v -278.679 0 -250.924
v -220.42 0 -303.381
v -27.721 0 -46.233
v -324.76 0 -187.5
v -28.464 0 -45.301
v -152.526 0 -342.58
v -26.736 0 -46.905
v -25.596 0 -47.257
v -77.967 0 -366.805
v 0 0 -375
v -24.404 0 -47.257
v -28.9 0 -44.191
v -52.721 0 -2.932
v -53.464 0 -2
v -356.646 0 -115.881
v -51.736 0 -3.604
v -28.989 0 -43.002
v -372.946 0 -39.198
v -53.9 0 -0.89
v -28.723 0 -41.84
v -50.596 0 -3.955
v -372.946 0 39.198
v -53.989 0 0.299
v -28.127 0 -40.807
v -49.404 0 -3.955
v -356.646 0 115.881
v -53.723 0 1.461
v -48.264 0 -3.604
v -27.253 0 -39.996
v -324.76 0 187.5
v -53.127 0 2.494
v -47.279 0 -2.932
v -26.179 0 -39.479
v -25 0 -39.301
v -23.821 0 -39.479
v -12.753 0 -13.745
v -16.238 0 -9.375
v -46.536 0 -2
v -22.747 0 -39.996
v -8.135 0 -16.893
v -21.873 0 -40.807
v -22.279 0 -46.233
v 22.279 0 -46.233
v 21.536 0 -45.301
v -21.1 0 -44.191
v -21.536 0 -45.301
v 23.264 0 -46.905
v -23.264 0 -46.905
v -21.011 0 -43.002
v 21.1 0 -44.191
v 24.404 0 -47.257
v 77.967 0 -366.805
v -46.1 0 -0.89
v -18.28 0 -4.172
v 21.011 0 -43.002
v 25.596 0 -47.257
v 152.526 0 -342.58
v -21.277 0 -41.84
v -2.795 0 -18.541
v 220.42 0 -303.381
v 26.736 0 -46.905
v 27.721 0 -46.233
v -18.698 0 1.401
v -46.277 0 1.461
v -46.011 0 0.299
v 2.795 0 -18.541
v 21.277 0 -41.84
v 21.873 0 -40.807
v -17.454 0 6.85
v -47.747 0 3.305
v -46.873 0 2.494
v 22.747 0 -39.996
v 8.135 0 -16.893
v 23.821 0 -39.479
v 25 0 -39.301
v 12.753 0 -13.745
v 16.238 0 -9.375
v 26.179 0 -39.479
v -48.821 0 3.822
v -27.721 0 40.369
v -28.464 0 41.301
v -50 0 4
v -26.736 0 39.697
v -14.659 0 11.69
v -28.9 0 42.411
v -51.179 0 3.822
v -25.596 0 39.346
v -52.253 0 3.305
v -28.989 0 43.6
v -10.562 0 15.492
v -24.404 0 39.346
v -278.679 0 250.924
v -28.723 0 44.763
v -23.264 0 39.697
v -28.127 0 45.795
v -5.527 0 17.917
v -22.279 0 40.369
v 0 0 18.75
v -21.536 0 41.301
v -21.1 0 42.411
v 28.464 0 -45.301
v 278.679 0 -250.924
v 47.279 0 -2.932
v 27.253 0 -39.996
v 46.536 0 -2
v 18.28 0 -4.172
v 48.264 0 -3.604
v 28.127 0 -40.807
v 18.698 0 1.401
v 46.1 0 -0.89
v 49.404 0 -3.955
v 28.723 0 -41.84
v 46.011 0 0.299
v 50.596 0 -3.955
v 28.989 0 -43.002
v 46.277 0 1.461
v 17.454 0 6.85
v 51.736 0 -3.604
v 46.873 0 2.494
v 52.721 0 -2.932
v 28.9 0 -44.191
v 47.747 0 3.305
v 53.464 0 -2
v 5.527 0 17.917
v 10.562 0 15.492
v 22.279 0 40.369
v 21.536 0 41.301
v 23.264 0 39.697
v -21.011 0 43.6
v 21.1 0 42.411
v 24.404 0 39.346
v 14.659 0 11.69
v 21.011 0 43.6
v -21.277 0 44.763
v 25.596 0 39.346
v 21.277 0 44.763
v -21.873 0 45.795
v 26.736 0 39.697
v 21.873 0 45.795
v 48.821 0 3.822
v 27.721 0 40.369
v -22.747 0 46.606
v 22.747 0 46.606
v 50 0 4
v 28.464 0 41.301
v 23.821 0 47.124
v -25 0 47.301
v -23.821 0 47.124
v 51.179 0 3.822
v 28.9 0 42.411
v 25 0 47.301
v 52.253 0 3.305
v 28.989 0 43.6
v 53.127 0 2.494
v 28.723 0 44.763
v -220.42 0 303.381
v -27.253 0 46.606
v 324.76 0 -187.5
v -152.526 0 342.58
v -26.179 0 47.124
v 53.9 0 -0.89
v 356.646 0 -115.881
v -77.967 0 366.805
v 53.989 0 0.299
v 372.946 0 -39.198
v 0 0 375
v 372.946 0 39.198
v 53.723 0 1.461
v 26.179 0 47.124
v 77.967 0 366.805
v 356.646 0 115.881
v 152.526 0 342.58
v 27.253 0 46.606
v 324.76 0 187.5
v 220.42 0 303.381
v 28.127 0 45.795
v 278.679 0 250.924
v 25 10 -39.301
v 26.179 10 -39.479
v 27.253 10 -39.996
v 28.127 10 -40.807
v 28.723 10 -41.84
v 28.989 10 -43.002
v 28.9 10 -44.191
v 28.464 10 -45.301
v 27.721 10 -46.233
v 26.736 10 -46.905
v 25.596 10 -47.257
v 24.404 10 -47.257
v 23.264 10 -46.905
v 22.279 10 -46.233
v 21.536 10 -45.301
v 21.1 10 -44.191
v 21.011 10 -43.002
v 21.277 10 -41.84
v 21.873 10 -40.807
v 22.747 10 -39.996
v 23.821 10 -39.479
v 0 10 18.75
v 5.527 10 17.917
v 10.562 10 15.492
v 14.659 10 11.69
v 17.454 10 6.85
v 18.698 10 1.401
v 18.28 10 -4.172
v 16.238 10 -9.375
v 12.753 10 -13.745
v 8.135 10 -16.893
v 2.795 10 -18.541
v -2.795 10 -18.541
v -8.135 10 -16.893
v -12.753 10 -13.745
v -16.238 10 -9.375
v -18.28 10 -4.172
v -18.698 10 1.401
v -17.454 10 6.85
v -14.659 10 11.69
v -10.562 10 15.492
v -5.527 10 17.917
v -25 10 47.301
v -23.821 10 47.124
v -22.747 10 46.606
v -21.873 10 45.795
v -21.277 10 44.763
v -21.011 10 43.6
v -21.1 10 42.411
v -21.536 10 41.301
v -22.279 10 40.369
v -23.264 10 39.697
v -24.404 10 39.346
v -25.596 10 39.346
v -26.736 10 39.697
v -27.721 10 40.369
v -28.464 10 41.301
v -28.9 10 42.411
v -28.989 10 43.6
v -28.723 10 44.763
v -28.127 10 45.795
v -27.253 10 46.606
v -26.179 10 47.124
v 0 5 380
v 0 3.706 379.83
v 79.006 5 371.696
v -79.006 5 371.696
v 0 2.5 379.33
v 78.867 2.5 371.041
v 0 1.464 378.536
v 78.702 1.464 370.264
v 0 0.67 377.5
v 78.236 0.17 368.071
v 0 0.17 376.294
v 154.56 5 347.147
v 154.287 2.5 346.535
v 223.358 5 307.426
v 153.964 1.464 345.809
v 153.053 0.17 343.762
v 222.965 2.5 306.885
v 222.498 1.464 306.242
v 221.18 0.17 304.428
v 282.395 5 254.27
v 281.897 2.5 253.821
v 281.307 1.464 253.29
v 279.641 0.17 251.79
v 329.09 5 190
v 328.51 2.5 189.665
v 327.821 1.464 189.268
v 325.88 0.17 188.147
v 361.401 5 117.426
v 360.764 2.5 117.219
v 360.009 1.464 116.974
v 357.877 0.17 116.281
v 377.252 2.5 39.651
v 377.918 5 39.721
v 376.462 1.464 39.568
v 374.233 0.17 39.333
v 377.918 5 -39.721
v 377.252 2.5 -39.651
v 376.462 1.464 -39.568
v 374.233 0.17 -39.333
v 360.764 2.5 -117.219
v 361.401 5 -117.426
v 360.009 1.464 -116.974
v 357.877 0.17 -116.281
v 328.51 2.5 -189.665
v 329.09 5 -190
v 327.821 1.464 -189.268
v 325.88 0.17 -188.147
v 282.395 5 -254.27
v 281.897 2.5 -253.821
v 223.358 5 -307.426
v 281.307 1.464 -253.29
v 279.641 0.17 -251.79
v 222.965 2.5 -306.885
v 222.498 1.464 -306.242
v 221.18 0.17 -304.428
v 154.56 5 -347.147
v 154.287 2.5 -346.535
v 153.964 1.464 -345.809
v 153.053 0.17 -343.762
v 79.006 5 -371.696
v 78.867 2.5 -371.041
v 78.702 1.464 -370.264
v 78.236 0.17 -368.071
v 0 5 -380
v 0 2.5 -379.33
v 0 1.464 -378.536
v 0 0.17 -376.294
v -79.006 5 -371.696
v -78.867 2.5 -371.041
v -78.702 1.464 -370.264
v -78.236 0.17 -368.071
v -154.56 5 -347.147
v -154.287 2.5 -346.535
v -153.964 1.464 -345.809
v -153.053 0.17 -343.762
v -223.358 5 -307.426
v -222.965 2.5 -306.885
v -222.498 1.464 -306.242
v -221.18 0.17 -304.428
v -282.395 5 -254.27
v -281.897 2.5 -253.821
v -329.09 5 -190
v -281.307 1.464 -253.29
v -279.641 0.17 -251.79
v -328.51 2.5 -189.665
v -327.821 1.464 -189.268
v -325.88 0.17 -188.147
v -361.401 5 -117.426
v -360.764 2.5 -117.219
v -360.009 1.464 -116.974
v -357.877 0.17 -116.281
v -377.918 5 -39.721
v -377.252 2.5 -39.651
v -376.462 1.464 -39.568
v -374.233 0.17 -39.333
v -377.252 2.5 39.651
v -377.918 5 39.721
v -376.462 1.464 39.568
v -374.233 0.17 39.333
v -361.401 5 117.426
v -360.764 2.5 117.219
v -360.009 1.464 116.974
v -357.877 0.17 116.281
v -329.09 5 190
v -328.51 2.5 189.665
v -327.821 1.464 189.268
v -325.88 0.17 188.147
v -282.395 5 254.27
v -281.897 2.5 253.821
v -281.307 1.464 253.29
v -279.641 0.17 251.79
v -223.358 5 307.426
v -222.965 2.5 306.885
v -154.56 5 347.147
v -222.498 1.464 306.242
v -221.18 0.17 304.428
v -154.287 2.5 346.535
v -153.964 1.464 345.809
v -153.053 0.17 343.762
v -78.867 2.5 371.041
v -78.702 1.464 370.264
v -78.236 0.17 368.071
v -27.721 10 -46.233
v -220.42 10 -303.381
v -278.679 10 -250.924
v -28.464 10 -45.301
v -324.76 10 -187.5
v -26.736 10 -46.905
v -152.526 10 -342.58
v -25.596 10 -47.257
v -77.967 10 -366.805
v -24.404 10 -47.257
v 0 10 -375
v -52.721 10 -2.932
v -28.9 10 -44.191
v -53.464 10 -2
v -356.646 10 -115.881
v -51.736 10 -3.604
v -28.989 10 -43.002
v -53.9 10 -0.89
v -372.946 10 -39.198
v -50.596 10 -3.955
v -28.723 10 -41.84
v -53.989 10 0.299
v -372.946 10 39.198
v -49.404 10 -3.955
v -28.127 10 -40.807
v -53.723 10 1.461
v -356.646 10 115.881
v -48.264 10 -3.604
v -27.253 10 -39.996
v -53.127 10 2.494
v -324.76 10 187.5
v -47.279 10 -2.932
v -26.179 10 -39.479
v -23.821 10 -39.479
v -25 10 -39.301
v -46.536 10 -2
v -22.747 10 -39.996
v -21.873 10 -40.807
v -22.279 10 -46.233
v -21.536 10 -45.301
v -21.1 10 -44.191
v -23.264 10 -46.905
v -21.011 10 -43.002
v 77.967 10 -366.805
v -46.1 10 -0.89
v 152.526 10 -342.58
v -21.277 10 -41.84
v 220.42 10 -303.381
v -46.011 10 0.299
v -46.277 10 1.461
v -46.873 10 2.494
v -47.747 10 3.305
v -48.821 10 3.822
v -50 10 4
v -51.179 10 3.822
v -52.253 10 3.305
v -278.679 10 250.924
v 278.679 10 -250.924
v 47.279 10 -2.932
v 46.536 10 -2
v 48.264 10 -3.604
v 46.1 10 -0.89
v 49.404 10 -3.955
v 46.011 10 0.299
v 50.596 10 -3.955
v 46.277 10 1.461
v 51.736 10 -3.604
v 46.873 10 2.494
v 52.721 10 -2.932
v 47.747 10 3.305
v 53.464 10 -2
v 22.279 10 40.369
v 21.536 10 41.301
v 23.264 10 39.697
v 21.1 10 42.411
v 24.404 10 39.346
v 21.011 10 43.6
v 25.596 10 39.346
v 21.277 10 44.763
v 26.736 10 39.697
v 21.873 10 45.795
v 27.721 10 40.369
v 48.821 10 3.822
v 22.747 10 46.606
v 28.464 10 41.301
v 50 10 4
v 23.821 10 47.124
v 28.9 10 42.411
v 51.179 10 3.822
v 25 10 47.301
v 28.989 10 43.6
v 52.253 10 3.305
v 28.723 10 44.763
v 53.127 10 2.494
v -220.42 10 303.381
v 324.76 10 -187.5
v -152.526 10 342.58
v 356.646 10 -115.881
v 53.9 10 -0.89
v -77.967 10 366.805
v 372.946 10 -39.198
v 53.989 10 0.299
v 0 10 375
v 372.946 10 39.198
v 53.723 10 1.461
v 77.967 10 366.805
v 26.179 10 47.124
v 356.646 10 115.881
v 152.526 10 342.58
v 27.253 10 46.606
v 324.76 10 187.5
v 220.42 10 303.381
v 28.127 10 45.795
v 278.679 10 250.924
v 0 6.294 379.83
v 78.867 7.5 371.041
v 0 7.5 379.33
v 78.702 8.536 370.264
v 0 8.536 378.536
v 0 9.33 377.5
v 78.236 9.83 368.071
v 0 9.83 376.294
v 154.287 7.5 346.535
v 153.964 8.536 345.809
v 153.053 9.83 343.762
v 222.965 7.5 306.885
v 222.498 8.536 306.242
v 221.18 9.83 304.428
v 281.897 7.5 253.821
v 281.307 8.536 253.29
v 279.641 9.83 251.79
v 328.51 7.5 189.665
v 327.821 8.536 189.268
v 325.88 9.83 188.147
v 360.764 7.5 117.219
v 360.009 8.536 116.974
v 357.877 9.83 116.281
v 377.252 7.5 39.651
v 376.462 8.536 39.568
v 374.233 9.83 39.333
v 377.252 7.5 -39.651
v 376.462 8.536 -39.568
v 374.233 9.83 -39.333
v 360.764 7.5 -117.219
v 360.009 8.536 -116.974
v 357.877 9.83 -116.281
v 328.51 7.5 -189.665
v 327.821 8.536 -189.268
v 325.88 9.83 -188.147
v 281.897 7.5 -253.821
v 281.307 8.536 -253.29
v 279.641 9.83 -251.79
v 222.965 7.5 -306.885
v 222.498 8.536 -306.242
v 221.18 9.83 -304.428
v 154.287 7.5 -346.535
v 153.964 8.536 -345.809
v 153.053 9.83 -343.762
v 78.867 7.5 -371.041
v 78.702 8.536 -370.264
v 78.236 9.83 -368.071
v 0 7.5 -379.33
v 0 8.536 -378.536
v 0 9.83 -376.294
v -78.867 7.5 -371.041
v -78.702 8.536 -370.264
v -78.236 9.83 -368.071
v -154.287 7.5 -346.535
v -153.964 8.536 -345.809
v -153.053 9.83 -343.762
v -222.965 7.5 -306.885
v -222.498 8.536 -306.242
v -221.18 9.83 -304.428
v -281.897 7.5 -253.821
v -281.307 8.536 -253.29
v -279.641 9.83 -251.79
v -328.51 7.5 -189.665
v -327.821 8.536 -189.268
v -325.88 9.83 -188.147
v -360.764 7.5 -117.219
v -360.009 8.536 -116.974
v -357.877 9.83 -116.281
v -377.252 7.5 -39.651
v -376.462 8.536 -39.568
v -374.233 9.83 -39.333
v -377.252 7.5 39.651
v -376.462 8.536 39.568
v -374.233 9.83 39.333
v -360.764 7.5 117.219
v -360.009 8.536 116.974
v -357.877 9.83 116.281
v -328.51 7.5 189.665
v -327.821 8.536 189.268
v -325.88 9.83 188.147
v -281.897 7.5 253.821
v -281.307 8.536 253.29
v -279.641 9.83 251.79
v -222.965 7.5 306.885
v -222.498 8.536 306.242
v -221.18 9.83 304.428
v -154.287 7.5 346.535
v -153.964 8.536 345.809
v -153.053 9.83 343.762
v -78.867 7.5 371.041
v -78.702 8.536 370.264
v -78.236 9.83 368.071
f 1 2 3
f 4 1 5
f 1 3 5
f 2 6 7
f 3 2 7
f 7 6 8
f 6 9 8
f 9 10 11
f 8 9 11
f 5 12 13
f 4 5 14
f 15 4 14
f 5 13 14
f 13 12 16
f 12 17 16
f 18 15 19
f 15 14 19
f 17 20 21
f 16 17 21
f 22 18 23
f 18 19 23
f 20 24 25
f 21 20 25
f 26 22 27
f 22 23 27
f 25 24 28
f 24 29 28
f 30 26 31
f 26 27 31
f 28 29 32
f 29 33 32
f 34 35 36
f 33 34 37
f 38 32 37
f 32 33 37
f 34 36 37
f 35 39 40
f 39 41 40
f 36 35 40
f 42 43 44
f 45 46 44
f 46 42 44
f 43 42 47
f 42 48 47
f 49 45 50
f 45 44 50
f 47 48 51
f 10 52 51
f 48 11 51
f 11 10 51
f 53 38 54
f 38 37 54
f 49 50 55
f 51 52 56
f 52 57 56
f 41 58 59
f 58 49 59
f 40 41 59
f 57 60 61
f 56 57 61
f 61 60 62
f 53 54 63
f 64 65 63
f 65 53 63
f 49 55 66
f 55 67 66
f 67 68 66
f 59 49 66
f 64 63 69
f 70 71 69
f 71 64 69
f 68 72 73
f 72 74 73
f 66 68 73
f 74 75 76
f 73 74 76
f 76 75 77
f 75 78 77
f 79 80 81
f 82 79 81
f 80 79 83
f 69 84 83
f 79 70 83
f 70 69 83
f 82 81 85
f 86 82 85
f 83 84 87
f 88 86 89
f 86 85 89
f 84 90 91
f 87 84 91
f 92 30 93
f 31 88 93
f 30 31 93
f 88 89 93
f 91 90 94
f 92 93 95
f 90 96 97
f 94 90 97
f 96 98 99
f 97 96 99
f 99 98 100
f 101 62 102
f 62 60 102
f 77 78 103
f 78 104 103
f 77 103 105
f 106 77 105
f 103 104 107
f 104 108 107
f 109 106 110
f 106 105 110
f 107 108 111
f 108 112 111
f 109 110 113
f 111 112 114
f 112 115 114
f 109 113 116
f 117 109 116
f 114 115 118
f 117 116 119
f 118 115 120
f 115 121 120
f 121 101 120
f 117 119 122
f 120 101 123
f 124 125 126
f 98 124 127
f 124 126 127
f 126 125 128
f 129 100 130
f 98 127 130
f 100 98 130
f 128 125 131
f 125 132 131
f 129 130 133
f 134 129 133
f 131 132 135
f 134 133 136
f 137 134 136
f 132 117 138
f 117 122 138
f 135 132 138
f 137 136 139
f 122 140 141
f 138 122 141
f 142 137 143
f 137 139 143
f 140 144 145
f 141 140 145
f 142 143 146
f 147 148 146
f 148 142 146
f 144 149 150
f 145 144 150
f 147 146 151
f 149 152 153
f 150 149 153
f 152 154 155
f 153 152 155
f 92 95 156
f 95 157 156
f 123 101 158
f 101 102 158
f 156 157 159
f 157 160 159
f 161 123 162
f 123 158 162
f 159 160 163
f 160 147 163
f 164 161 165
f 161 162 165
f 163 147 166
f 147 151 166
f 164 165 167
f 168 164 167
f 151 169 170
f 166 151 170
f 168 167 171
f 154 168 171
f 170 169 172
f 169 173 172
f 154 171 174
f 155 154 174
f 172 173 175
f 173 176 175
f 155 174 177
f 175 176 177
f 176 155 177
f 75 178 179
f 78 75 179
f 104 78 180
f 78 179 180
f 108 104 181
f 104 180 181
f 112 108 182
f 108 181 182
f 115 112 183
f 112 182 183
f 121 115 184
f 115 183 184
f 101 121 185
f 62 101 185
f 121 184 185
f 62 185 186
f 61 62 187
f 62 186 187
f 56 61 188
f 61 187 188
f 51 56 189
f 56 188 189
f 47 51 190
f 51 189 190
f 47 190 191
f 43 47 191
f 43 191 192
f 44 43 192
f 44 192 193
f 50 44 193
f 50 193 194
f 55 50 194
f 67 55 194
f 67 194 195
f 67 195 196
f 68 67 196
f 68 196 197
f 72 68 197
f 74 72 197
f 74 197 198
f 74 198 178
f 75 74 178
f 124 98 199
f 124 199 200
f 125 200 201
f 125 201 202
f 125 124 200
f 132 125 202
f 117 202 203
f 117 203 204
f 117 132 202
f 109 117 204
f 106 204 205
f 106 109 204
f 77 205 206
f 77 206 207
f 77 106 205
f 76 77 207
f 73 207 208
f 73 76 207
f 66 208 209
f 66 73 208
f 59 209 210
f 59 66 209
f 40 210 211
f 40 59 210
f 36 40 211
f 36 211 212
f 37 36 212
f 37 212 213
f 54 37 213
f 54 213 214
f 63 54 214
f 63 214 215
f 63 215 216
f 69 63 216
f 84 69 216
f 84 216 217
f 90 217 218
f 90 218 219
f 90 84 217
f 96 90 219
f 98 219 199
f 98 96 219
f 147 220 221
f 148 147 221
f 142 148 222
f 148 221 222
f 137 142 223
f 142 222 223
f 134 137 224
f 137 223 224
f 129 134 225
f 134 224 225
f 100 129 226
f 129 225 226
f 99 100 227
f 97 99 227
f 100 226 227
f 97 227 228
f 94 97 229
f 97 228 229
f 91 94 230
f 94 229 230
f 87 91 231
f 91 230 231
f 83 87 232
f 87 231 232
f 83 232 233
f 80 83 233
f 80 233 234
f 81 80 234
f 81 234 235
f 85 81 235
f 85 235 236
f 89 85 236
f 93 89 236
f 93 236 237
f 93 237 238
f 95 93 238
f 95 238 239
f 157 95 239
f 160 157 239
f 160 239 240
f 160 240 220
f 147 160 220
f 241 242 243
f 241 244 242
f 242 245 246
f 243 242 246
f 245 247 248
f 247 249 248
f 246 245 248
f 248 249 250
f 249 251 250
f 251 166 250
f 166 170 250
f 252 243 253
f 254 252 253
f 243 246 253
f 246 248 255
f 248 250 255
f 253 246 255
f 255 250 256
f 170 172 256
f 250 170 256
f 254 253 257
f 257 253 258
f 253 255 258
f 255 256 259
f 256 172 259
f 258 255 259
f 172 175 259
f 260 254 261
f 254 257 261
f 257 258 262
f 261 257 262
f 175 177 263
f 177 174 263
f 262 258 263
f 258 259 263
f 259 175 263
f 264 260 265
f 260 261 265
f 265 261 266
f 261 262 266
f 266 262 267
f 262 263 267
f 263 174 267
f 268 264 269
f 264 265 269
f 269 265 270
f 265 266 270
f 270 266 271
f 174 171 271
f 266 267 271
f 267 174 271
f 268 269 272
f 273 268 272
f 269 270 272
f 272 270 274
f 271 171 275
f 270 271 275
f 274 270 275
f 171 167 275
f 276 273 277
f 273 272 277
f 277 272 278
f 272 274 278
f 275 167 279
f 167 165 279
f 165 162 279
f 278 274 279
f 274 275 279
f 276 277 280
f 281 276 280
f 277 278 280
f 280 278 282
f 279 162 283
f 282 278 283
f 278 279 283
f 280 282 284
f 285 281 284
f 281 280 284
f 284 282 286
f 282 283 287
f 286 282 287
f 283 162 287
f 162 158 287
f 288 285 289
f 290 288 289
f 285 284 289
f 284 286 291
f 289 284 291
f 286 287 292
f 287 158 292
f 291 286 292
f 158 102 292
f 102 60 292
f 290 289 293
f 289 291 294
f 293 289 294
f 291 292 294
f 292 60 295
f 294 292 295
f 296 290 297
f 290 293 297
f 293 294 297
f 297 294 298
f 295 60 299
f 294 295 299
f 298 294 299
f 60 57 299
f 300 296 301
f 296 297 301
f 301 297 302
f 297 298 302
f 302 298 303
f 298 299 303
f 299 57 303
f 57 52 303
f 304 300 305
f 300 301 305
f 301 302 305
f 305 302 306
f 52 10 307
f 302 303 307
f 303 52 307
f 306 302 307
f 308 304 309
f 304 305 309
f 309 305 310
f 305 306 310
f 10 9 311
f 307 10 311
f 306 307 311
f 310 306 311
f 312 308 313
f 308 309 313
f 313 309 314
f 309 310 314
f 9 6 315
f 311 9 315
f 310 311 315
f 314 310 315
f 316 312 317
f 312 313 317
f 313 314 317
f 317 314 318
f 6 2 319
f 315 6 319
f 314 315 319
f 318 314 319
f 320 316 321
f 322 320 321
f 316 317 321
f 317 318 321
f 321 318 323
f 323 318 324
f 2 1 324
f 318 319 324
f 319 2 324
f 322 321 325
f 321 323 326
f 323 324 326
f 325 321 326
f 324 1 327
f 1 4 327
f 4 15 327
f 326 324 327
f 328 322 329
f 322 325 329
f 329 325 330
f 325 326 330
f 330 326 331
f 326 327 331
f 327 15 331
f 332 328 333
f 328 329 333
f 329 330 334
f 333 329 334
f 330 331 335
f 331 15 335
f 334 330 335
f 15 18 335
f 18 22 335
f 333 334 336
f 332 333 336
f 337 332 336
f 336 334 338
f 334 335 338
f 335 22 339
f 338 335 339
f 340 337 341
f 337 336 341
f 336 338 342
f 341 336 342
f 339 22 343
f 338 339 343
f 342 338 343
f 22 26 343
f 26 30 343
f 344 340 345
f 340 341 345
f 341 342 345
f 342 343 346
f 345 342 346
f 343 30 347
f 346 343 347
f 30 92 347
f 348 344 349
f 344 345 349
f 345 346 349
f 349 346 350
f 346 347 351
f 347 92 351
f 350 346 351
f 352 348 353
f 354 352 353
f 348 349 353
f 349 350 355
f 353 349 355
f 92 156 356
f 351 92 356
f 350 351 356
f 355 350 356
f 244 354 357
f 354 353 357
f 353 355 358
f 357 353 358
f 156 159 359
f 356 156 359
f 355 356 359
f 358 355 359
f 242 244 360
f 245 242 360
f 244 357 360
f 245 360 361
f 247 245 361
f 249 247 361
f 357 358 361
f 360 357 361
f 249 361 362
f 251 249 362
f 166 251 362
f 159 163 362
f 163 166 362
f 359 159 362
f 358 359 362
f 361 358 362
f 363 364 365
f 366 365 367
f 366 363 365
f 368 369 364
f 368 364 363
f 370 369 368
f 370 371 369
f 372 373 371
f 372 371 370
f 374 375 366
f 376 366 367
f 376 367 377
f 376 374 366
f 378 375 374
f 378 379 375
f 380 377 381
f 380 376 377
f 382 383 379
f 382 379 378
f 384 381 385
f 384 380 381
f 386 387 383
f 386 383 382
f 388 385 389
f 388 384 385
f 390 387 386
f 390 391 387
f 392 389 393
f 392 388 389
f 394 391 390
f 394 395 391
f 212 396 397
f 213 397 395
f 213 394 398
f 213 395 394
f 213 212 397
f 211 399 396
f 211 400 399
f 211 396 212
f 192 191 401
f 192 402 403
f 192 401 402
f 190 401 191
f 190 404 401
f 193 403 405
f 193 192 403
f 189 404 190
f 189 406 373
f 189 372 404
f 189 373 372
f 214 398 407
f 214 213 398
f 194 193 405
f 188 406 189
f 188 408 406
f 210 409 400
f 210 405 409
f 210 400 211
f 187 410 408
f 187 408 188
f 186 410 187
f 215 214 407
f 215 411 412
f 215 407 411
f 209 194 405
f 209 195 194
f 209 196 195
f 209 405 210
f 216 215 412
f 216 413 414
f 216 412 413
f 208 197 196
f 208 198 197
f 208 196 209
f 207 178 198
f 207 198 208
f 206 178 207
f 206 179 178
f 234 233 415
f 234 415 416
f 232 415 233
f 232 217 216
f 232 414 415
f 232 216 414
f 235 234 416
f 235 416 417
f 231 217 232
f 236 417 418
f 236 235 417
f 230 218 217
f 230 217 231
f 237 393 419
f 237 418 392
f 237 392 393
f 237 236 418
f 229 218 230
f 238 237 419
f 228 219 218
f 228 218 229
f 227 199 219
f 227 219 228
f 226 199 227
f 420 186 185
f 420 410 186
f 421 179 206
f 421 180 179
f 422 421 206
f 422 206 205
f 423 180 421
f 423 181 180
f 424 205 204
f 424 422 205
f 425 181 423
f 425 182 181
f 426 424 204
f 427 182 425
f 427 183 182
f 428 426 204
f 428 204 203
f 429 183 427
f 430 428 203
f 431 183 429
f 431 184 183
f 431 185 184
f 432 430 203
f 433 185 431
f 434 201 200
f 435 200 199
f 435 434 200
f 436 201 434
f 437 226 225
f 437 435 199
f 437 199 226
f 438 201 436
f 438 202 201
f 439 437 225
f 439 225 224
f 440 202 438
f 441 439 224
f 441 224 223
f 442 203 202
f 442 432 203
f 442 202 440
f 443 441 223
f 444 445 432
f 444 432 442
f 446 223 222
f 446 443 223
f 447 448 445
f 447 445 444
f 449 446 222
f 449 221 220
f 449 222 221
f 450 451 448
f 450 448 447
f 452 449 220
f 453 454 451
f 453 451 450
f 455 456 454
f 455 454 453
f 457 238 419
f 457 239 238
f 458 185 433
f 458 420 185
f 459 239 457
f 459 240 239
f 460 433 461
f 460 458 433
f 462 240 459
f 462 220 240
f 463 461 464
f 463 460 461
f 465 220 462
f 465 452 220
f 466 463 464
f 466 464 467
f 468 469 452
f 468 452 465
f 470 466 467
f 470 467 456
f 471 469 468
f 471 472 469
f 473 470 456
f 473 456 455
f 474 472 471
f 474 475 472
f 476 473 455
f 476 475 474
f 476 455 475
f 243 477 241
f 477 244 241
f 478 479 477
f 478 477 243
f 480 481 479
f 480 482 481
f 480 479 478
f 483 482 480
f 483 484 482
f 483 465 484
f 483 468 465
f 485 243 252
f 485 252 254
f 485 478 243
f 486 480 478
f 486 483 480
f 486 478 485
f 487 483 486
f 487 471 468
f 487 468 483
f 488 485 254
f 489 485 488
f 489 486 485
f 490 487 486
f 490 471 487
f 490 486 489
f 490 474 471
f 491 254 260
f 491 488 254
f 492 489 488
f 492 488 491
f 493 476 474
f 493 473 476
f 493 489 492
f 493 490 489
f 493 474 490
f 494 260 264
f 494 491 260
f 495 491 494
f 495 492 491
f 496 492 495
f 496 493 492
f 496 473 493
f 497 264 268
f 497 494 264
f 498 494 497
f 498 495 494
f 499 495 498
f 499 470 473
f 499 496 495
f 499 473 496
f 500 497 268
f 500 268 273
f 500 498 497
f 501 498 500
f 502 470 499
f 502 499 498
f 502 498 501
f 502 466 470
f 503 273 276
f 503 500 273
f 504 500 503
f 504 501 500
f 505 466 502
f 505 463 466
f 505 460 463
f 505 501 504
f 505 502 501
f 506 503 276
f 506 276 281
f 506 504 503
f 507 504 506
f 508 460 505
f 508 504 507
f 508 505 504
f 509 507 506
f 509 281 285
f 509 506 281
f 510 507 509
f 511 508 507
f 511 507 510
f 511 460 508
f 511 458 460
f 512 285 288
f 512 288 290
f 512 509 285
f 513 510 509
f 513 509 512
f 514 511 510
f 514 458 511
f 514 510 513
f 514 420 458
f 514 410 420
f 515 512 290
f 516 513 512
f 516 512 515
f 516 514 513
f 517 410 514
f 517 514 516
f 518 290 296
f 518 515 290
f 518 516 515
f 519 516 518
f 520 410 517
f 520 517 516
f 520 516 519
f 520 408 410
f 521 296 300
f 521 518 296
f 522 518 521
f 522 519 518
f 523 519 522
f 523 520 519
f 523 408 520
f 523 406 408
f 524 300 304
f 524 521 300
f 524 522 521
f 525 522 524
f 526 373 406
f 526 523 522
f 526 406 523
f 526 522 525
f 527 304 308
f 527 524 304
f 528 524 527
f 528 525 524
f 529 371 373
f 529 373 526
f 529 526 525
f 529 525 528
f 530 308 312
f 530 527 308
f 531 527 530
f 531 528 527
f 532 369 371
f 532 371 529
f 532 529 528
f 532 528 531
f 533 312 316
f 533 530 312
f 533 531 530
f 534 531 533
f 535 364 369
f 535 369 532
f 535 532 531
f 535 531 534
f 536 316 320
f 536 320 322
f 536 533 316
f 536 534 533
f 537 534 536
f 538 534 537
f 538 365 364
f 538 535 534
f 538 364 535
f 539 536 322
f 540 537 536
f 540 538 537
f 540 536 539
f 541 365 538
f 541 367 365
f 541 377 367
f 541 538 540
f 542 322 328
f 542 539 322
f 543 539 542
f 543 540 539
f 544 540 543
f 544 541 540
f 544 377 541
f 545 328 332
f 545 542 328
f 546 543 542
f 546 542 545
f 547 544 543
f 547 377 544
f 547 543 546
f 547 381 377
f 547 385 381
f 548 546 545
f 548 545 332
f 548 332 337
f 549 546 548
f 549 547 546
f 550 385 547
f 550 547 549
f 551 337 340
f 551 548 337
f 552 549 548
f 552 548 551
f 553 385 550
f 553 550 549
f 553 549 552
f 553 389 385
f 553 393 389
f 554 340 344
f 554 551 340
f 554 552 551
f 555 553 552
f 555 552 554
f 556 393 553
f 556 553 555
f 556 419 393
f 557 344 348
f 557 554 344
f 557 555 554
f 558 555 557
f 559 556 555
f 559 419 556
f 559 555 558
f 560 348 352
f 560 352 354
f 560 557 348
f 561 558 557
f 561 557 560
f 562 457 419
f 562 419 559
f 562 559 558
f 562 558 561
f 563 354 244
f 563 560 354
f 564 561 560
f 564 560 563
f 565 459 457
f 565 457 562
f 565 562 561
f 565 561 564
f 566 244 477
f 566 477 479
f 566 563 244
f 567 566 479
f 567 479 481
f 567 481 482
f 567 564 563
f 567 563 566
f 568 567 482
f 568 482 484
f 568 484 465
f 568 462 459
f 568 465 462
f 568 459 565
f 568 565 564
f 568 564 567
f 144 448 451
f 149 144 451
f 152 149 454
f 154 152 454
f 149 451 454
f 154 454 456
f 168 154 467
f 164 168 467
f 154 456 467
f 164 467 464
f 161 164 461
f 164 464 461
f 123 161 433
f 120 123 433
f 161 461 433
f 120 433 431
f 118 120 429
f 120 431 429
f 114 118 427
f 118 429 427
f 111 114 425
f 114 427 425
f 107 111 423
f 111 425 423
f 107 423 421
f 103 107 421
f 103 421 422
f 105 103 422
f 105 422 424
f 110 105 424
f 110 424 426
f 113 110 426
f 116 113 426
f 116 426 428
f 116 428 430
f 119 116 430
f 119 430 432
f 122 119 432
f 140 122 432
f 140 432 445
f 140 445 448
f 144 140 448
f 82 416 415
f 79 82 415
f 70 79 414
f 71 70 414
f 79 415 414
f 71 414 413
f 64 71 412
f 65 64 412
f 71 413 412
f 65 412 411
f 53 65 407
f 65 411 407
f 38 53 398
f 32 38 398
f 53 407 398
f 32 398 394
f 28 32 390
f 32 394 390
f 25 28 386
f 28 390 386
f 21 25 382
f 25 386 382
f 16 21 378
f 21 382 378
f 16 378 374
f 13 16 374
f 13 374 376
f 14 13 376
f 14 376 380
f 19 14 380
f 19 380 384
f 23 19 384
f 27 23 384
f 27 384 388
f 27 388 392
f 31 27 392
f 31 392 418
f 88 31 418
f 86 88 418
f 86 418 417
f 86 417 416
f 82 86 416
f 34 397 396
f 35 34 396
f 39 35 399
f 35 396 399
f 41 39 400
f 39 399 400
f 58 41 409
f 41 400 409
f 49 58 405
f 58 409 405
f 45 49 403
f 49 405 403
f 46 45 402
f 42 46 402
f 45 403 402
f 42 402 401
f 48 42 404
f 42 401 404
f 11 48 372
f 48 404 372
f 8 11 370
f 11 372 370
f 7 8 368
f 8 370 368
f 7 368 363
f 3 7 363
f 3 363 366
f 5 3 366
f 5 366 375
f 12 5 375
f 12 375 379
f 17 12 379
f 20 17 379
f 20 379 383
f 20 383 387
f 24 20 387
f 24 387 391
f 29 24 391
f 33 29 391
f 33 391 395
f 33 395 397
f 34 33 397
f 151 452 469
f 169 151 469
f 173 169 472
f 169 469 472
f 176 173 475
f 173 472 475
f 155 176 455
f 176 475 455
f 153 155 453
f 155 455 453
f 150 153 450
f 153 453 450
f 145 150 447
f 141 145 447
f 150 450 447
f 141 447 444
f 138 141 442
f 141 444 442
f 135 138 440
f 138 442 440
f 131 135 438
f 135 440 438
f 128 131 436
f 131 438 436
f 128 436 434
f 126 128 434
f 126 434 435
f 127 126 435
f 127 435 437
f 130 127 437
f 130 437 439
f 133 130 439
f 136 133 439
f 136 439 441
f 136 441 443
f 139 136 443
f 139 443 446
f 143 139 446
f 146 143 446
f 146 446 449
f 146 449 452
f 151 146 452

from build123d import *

# Parameters (mm, degrees)
CROQUIS1_R              = 380
CROQUIS1_R_2            = 18.75
SALIENTE_EXTRUIR1_DEPTH = 10
CROQUIS2_R              = 4
CORTAR_EXTRUIR1_DEPTH   = 538.494186015
REDONDEO1_R             = 5


with BuildPart() as part:
    # Croquis1 → Saliente-Extruir1 (new body)
    with BuildSketch(Plane(origin=(0, 0, 0), x_dir=(1, 0, 0), z_dir=(0, 1, 0))):
        with Locations(Location((0, 0, 0), (0, 0, 270))):
            Circle(CROQUIS1_R)
        with Locations(Location((0, 0, 0), (0, 0, 270))):
            Circle(CROQUIS1_R_2, mode=Mode.SUBTRACT)
    extrude(amount=SALIENTE_EXTRUIR1_DEPTH)

    # Croquis2 → Cortar-Extruir1 (cut, through all)
    with BuildSketch(Plane(origin=(0, 10, 0), x_dir=(1, 0, 0), z_dir=(0, 1, 0))):
        with Locations(Location((-25, -43.301270189, 0), (0, 0, 270))):
            Circle(CROQUIS2_R)
        with Locations(Location((-50, 0, 0), (0, 0, 270))):
            Circle(CROQUIS2_R)
        with Locations(Location((-25, 43.301270189, 0), (0, 0, 270))):
            Circle(CROQUIS2_R)
        with Locations(Location((25, 43.301270189, 0), (0, 0, 270))):
            Circle(CROQUIS2_R)
        with Locations(Location((50, 0, 0), (0, 0, 270))):
            Circle(CROQUIS2_R)
        with Locations(Location((25, -43.301270189, 0), (0, 0, 270))):
            Circle(CROQUIS2_R)
    extrude(amount=-CORTAR_EXTRUIR1_DEPTH, mode=Mode.SUBTRACT)

    # Redondeo1
    redondeo1_edges = [part.edges().sort_by_distance(p)[0] for p in [
        (0, 0, -380),
        (0, 10, -380),
    ]]
    fillet(redondeo1_edges, radius=REDONDEO1_R - 0.0001)  # a hair under: the kernel refuses the full size


solid = part.part
